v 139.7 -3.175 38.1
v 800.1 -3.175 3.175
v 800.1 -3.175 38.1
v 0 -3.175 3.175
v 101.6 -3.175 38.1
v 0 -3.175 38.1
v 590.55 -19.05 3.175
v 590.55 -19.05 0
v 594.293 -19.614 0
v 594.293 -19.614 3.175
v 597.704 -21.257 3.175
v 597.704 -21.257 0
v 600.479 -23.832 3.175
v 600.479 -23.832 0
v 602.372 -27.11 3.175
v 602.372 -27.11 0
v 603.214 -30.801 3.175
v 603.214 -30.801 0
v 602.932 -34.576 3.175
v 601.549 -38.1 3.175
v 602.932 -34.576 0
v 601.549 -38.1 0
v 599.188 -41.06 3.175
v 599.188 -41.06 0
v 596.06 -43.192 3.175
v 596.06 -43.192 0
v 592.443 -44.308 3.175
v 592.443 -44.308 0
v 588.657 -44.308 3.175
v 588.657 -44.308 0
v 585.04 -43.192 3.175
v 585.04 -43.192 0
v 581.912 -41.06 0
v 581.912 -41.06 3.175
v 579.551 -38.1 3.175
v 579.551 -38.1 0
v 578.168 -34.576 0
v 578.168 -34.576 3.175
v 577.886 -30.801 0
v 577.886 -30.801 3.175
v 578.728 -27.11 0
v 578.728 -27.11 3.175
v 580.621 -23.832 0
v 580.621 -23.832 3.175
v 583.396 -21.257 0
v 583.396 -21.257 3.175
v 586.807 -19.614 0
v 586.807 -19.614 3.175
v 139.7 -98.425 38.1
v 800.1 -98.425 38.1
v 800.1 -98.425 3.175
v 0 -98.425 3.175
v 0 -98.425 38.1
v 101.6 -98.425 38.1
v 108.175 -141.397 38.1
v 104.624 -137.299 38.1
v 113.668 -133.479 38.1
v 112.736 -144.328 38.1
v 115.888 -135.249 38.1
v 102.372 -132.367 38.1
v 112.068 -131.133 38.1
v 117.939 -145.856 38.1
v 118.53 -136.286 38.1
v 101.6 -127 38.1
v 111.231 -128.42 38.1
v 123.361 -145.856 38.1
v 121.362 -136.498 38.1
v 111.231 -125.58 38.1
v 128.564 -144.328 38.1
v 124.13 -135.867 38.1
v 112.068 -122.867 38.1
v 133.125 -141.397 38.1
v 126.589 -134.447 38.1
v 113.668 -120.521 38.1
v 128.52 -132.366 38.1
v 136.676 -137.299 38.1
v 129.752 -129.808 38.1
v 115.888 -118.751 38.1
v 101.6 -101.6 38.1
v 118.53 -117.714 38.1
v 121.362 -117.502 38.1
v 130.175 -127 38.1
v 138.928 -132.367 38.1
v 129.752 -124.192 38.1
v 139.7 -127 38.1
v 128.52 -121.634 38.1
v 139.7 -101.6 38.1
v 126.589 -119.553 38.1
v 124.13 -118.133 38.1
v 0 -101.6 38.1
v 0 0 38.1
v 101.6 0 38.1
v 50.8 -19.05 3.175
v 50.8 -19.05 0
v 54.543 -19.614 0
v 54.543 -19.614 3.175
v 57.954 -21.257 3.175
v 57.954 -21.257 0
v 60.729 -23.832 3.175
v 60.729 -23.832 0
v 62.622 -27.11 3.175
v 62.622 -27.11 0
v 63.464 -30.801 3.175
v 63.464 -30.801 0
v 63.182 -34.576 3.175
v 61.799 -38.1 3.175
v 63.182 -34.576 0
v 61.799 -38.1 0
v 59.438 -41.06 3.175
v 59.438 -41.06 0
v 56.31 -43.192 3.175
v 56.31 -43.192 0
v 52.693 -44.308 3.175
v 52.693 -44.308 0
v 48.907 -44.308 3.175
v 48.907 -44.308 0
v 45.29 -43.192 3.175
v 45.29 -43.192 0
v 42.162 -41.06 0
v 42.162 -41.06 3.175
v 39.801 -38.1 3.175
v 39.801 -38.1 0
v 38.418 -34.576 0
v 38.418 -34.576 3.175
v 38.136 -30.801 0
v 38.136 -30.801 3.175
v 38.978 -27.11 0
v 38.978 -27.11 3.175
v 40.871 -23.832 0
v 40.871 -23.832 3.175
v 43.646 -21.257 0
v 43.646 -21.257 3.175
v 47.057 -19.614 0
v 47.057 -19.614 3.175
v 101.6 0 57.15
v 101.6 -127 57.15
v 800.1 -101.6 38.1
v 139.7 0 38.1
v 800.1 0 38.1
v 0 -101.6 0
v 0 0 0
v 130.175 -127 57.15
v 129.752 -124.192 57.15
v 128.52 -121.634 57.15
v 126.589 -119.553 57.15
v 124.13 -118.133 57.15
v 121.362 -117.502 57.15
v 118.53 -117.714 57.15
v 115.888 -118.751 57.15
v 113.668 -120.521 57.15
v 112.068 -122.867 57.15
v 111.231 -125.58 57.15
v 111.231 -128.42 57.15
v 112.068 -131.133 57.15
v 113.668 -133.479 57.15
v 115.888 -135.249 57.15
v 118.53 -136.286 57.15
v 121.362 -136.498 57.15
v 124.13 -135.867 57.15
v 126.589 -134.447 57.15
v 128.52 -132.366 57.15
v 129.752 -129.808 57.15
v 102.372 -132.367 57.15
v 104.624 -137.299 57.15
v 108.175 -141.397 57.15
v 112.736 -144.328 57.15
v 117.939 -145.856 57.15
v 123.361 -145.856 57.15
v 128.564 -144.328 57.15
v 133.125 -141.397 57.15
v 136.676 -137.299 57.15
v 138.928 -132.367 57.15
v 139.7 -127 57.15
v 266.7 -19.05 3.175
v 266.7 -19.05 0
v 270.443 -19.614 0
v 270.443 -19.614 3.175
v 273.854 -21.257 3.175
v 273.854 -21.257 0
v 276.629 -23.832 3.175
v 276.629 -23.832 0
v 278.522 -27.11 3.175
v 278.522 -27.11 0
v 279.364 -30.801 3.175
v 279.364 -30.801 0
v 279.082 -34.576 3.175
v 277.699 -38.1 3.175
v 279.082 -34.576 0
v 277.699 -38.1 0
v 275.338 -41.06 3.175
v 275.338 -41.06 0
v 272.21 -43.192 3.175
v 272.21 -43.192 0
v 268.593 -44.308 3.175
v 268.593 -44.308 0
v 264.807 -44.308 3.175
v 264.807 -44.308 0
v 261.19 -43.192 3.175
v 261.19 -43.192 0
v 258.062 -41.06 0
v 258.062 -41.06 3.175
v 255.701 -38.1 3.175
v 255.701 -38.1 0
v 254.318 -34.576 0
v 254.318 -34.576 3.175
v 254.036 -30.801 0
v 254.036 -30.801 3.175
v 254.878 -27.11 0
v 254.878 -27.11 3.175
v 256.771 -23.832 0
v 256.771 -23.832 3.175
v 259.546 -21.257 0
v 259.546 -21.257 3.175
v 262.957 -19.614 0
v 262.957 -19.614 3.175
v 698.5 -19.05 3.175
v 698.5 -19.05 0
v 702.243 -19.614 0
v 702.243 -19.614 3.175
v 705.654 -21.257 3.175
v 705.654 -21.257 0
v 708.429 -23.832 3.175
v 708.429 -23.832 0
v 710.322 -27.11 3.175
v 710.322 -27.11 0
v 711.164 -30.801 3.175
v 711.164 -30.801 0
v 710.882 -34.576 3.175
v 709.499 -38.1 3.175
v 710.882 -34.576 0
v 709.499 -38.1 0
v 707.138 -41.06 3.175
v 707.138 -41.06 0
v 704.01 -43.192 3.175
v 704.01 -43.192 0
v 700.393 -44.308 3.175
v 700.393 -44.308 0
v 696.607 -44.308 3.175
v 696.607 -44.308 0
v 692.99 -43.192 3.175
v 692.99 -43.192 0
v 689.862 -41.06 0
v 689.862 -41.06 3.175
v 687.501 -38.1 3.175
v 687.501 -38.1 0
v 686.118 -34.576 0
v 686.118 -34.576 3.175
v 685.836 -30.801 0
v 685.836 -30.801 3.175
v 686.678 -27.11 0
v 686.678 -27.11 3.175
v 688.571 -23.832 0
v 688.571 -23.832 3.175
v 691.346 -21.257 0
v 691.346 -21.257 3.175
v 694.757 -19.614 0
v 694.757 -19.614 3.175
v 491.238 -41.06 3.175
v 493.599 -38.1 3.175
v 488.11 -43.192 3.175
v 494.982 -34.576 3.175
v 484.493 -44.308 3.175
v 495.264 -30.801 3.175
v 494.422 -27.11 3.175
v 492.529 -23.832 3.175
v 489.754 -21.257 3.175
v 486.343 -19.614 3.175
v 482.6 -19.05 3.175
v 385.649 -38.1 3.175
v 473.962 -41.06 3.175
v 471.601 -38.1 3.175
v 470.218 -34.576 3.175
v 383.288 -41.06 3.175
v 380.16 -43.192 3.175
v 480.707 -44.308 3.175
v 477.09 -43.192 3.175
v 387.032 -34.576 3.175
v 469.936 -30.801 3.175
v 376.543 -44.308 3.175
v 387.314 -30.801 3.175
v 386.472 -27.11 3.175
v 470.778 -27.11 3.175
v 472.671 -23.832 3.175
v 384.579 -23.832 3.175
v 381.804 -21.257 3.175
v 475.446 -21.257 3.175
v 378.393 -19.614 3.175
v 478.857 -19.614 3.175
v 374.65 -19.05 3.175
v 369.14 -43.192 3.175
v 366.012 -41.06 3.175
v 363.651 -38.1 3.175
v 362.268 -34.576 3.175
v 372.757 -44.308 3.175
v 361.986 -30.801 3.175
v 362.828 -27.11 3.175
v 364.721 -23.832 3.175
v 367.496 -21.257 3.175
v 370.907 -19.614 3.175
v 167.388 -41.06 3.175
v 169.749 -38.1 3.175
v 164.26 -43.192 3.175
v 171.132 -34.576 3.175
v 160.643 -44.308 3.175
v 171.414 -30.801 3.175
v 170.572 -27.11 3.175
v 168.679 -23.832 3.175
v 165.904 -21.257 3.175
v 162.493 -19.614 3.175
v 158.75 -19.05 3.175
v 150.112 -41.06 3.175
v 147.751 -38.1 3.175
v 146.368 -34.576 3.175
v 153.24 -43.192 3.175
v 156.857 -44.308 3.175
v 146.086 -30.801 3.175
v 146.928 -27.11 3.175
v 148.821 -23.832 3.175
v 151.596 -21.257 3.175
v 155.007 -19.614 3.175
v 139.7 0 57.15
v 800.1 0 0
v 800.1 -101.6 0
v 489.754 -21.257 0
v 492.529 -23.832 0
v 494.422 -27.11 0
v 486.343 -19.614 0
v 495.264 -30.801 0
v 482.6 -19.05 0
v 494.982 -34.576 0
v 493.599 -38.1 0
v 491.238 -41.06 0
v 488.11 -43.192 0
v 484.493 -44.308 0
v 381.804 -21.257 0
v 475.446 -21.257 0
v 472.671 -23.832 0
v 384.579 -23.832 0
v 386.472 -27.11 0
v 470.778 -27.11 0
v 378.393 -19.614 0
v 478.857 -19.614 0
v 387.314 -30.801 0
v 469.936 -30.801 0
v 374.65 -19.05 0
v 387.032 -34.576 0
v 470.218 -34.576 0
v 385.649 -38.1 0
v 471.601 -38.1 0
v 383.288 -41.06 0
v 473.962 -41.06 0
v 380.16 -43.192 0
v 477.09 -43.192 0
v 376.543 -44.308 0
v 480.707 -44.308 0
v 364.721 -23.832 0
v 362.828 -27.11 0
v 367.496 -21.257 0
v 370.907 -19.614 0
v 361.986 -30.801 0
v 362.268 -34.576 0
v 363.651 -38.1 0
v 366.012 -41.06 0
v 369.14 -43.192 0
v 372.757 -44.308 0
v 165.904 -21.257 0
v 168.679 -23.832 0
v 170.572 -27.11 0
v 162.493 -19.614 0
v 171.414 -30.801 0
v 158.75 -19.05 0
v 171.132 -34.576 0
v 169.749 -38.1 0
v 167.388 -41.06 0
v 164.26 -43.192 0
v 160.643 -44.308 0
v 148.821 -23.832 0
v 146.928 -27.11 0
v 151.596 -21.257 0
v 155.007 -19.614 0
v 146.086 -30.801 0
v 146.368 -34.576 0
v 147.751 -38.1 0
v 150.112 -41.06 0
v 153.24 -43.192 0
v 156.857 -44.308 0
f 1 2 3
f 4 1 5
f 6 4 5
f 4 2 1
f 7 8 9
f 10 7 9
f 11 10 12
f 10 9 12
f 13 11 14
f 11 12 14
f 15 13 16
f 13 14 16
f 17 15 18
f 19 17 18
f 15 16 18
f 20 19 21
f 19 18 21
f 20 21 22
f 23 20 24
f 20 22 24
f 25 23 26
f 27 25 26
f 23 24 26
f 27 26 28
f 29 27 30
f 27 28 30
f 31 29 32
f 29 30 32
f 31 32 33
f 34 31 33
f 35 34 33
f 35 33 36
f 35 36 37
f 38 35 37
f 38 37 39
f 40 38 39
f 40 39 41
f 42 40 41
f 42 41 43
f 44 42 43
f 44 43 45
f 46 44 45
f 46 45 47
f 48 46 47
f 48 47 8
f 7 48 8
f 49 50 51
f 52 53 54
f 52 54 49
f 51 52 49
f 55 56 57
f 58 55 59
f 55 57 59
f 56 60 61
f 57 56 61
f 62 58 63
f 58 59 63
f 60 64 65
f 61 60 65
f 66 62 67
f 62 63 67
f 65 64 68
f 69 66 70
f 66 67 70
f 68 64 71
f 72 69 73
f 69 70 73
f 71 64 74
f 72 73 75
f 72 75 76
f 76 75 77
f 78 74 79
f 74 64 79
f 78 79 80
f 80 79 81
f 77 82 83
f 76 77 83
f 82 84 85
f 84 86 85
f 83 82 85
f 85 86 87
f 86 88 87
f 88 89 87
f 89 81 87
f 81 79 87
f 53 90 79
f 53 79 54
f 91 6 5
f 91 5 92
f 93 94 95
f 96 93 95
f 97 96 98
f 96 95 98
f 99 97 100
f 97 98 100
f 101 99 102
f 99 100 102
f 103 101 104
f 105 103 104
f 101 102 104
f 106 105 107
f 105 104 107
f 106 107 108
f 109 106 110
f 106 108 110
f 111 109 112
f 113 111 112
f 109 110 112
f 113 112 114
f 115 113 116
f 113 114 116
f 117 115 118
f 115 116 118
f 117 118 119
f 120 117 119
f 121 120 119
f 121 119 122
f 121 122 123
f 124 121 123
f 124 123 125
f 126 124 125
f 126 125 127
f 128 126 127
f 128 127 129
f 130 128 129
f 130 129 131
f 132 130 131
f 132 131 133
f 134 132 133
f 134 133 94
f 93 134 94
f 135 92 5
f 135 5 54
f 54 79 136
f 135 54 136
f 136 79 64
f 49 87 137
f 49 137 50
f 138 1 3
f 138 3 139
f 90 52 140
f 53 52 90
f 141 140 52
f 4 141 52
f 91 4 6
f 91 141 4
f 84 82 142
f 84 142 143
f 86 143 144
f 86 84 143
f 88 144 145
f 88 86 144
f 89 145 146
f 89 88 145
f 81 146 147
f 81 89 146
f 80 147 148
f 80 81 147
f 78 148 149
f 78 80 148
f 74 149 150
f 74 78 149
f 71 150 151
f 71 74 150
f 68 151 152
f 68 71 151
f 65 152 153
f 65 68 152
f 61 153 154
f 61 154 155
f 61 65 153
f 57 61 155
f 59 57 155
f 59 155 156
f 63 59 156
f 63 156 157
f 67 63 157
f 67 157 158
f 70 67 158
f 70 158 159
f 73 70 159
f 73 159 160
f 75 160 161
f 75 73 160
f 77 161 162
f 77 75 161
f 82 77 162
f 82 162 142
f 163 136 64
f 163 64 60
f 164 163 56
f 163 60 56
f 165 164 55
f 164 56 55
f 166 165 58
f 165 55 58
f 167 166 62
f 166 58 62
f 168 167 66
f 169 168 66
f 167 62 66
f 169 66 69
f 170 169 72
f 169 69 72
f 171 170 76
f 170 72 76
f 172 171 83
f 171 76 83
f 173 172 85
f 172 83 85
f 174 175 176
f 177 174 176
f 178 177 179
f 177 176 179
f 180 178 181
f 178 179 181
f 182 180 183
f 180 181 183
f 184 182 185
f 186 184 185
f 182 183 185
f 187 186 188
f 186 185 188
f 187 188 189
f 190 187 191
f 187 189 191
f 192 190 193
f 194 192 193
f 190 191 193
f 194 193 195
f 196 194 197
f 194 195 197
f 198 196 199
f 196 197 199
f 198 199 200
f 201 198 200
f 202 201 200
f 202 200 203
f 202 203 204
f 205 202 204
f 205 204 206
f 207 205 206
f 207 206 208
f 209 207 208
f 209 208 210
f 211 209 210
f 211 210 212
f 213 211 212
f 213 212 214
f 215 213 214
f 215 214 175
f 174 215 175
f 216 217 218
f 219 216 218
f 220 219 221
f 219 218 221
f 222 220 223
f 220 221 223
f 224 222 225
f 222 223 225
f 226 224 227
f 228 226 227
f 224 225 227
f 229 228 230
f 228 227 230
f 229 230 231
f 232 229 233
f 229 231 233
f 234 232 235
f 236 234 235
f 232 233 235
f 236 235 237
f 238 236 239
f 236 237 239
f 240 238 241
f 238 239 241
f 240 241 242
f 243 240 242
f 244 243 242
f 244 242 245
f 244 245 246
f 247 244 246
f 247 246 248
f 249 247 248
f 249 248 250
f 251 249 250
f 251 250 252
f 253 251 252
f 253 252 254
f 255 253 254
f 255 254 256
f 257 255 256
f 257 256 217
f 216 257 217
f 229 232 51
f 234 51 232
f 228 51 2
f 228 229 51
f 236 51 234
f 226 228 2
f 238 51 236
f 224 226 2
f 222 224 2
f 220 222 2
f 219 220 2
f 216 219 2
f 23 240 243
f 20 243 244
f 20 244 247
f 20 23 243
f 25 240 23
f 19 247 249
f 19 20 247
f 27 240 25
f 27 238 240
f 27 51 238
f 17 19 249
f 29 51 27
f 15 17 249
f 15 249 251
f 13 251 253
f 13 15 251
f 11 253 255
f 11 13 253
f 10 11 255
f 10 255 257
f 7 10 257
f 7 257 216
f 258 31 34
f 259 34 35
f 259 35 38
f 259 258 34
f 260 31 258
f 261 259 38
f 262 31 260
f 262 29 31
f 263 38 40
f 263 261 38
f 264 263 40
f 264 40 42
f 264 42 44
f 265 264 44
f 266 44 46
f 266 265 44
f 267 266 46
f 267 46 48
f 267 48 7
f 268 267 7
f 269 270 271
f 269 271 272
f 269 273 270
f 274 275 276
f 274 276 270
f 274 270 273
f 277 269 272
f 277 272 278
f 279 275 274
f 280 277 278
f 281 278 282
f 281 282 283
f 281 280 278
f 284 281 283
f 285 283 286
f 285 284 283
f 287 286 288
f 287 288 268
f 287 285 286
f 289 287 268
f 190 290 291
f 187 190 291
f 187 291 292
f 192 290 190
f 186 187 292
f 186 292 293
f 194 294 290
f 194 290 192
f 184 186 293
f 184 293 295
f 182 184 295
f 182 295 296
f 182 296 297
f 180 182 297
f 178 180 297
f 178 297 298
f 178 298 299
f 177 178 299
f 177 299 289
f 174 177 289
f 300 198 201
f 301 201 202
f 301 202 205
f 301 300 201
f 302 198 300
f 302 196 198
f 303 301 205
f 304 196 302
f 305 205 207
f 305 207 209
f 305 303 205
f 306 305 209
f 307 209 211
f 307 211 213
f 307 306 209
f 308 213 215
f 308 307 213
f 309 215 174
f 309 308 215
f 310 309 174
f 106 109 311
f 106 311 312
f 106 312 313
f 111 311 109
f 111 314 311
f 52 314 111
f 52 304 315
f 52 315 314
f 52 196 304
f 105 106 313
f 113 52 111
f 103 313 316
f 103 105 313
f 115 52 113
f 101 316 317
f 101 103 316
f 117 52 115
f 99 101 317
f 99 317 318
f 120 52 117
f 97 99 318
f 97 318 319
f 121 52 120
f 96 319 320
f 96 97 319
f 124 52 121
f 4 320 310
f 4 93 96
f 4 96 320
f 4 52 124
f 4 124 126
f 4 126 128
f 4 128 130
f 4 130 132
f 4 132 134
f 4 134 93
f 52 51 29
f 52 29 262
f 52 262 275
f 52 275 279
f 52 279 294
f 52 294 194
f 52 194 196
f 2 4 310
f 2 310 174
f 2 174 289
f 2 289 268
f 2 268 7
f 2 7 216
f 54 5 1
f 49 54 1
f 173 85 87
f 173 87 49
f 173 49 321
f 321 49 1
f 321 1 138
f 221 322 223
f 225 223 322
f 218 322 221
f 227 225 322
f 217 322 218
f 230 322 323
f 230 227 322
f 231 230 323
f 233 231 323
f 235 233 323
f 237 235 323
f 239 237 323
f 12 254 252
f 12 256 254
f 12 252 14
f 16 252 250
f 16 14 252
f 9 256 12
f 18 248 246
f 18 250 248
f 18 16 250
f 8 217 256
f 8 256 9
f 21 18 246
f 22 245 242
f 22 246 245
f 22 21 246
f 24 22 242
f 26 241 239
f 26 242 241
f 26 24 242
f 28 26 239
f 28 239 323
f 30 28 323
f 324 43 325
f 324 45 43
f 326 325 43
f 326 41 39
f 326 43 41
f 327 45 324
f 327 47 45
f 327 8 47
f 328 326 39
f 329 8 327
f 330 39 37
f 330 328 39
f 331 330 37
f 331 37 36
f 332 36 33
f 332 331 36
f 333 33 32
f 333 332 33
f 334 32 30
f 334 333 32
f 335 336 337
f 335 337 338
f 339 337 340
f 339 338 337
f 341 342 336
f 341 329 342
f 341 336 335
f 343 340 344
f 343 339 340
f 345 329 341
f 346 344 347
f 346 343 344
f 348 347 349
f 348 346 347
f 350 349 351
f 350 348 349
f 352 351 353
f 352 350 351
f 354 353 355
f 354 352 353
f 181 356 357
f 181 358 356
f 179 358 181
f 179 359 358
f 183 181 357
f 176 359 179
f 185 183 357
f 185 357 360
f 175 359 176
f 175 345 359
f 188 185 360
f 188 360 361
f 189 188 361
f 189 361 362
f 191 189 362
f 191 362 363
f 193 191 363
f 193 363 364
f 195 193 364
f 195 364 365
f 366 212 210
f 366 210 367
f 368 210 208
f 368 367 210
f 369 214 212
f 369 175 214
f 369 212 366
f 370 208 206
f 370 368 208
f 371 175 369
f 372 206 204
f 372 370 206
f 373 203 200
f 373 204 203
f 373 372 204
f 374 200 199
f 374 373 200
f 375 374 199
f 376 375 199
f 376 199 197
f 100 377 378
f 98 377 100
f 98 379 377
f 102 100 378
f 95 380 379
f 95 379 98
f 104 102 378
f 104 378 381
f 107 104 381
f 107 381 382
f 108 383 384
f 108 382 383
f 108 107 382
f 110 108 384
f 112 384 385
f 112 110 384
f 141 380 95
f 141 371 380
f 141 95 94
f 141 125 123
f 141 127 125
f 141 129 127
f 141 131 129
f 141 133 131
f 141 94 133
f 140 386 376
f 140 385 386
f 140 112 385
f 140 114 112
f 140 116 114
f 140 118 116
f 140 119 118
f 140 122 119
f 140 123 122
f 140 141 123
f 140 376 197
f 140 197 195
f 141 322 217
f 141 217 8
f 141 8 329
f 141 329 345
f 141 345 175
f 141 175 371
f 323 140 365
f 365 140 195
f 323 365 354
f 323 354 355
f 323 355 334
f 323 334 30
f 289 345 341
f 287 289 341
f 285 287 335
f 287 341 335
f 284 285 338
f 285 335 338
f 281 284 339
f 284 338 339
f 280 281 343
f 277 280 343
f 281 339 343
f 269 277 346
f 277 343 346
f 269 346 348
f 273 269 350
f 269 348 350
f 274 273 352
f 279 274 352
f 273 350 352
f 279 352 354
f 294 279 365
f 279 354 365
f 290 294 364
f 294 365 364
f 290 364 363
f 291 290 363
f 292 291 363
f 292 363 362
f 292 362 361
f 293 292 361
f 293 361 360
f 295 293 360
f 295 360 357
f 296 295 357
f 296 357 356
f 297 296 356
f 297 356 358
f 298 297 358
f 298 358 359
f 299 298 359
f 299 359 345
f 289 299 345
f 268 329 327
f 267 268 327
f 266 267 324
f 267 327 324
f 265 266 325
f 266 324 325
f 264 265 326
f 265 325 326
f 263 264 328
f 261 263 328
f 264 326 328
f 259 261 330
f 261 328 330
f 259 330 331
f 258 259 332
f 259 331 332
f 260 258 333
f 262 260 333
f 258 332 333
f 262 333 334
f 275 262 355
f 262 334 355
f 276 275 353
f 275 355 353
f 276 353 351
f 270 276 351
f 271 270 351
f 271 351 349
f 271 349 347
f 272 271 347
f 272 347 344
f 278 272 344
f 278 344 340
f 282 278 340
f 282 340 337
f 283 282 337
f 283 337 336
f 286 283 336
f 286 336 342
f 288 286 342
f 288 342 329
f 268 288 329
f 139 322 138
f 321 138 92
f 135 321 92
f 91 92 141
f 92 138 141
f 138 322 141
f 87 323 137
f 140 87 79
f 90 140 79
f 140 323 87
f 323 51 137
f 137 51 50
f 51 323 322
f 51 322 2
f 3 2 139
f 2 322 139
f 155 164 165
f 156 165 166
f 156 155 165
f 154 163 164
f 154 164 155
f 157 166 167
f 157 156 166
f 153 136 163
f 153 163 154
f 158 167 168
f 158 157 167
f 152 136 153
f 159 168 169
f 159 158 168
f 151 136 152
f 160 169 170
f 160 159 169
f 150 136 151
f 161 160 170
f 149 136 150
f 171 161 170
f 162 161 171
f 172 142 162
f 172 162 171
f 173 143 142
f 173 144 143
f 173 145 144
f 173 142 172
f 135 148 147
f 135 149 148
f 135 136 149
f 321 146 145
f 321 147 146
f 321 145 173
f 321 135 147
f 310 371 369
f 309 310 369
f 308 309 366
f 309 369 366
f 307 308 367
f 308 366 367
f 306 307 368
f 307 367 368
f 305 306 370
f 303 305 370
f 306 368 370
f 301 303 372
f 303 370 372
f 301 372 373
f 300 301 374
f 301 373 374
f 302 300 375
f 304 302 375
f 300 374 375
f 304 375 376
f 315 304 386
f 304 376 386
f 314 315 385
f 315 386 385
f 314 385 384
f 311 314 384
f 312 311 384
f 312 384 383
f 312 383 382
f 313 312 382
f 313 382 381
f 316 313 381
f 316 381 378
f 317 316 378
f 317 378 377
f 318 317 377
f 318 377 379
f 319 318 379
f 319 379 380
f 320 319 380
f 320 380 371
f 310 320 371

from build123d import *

# Parameters (mm, degrees)
BASE_EXTRUDE_THIN_DEPTH = 800.1
SKETCH2_R               = 12.7
CUT_EXTRUDE1_DEPTH      = 808.424411323
LPATTERN1_COUNT         = 7
LPATTERN1_PITCH         = 107.95
BOSS_EXTRUDE1_START     = 38.1
BOSS_EXTRUDE1_OUTLINE_R = 9.525
BOSS_EXTRUDE1_DEPTH     = 19.05


# Read off the part's stored shape, not the designer's step: Boss-Extrude1
with BuildPart() as part:
    # Sketch1 → Base-Extrude-Thin (new body)
    with BuildSketch(Plane(origin=(0, 0, 0), x_dir=(0, 0, -1), z_dir=(1, 0, 0))):
        Polygon((-38.1, 0), (0, 0), (0, -101.6), (-38.1, -101.6), (-38.1, -98.425), (-3.175, -98.425), (-3.175, -3.175), (-38.1, -3.175), align=None)
    extrude(amount=BASE_EXTRUDE_THIN_DEPTH)

    # Sketch2 → Cut-Extrude1 (cut, through all)
    with BuildSketch(Plane(origin=(0, 0, 0), x_dir=(-1, 0, 0), z_dir=(0, 0, -1))):
        with Locations(Location((-50.8, -31.75, 0), (0, 0, 90))):
            Circle(SKETCH2_R)
    cut_extrude1 = extrude(amount=-CUT_EXTRUDE1_DEPTH, mode=Mode.SUBTRACT)

    # LPattern1: Cut-Extrude1 ×7
    with Locations(*[(i * LPATTERN1_PITCH, 0, 0) for i in range(1, LPATTERN1_COUNT)]):
        add(cut_extrude1, mode=Mode.SUBTRACT)

    # Boss-Extrude1 outline → Boss-Extrude1 (add)
    with BuildSketch(Plane.XY.offset(BOSS_EXTRUDE1_START)):
        with BuildLine():
            Line((101.6, 0), (101.6, -127))
            ThreePointArc((101.6, -127), (120.65, -146.05), (139.7, -127))
            Line((139.7, -127), (139.7, 0))
            Line((139.7, 0), (101.6, 0))
        make_face()
        with Locations((120.65, -127)):
            Circle(BOSS_EXTRUDE1_OUTLINE_R, mode=Mode.SUBTRACT)
    extrude(amount=BOSS_EXTRUDE1_DEPTH)


solid = part.part
